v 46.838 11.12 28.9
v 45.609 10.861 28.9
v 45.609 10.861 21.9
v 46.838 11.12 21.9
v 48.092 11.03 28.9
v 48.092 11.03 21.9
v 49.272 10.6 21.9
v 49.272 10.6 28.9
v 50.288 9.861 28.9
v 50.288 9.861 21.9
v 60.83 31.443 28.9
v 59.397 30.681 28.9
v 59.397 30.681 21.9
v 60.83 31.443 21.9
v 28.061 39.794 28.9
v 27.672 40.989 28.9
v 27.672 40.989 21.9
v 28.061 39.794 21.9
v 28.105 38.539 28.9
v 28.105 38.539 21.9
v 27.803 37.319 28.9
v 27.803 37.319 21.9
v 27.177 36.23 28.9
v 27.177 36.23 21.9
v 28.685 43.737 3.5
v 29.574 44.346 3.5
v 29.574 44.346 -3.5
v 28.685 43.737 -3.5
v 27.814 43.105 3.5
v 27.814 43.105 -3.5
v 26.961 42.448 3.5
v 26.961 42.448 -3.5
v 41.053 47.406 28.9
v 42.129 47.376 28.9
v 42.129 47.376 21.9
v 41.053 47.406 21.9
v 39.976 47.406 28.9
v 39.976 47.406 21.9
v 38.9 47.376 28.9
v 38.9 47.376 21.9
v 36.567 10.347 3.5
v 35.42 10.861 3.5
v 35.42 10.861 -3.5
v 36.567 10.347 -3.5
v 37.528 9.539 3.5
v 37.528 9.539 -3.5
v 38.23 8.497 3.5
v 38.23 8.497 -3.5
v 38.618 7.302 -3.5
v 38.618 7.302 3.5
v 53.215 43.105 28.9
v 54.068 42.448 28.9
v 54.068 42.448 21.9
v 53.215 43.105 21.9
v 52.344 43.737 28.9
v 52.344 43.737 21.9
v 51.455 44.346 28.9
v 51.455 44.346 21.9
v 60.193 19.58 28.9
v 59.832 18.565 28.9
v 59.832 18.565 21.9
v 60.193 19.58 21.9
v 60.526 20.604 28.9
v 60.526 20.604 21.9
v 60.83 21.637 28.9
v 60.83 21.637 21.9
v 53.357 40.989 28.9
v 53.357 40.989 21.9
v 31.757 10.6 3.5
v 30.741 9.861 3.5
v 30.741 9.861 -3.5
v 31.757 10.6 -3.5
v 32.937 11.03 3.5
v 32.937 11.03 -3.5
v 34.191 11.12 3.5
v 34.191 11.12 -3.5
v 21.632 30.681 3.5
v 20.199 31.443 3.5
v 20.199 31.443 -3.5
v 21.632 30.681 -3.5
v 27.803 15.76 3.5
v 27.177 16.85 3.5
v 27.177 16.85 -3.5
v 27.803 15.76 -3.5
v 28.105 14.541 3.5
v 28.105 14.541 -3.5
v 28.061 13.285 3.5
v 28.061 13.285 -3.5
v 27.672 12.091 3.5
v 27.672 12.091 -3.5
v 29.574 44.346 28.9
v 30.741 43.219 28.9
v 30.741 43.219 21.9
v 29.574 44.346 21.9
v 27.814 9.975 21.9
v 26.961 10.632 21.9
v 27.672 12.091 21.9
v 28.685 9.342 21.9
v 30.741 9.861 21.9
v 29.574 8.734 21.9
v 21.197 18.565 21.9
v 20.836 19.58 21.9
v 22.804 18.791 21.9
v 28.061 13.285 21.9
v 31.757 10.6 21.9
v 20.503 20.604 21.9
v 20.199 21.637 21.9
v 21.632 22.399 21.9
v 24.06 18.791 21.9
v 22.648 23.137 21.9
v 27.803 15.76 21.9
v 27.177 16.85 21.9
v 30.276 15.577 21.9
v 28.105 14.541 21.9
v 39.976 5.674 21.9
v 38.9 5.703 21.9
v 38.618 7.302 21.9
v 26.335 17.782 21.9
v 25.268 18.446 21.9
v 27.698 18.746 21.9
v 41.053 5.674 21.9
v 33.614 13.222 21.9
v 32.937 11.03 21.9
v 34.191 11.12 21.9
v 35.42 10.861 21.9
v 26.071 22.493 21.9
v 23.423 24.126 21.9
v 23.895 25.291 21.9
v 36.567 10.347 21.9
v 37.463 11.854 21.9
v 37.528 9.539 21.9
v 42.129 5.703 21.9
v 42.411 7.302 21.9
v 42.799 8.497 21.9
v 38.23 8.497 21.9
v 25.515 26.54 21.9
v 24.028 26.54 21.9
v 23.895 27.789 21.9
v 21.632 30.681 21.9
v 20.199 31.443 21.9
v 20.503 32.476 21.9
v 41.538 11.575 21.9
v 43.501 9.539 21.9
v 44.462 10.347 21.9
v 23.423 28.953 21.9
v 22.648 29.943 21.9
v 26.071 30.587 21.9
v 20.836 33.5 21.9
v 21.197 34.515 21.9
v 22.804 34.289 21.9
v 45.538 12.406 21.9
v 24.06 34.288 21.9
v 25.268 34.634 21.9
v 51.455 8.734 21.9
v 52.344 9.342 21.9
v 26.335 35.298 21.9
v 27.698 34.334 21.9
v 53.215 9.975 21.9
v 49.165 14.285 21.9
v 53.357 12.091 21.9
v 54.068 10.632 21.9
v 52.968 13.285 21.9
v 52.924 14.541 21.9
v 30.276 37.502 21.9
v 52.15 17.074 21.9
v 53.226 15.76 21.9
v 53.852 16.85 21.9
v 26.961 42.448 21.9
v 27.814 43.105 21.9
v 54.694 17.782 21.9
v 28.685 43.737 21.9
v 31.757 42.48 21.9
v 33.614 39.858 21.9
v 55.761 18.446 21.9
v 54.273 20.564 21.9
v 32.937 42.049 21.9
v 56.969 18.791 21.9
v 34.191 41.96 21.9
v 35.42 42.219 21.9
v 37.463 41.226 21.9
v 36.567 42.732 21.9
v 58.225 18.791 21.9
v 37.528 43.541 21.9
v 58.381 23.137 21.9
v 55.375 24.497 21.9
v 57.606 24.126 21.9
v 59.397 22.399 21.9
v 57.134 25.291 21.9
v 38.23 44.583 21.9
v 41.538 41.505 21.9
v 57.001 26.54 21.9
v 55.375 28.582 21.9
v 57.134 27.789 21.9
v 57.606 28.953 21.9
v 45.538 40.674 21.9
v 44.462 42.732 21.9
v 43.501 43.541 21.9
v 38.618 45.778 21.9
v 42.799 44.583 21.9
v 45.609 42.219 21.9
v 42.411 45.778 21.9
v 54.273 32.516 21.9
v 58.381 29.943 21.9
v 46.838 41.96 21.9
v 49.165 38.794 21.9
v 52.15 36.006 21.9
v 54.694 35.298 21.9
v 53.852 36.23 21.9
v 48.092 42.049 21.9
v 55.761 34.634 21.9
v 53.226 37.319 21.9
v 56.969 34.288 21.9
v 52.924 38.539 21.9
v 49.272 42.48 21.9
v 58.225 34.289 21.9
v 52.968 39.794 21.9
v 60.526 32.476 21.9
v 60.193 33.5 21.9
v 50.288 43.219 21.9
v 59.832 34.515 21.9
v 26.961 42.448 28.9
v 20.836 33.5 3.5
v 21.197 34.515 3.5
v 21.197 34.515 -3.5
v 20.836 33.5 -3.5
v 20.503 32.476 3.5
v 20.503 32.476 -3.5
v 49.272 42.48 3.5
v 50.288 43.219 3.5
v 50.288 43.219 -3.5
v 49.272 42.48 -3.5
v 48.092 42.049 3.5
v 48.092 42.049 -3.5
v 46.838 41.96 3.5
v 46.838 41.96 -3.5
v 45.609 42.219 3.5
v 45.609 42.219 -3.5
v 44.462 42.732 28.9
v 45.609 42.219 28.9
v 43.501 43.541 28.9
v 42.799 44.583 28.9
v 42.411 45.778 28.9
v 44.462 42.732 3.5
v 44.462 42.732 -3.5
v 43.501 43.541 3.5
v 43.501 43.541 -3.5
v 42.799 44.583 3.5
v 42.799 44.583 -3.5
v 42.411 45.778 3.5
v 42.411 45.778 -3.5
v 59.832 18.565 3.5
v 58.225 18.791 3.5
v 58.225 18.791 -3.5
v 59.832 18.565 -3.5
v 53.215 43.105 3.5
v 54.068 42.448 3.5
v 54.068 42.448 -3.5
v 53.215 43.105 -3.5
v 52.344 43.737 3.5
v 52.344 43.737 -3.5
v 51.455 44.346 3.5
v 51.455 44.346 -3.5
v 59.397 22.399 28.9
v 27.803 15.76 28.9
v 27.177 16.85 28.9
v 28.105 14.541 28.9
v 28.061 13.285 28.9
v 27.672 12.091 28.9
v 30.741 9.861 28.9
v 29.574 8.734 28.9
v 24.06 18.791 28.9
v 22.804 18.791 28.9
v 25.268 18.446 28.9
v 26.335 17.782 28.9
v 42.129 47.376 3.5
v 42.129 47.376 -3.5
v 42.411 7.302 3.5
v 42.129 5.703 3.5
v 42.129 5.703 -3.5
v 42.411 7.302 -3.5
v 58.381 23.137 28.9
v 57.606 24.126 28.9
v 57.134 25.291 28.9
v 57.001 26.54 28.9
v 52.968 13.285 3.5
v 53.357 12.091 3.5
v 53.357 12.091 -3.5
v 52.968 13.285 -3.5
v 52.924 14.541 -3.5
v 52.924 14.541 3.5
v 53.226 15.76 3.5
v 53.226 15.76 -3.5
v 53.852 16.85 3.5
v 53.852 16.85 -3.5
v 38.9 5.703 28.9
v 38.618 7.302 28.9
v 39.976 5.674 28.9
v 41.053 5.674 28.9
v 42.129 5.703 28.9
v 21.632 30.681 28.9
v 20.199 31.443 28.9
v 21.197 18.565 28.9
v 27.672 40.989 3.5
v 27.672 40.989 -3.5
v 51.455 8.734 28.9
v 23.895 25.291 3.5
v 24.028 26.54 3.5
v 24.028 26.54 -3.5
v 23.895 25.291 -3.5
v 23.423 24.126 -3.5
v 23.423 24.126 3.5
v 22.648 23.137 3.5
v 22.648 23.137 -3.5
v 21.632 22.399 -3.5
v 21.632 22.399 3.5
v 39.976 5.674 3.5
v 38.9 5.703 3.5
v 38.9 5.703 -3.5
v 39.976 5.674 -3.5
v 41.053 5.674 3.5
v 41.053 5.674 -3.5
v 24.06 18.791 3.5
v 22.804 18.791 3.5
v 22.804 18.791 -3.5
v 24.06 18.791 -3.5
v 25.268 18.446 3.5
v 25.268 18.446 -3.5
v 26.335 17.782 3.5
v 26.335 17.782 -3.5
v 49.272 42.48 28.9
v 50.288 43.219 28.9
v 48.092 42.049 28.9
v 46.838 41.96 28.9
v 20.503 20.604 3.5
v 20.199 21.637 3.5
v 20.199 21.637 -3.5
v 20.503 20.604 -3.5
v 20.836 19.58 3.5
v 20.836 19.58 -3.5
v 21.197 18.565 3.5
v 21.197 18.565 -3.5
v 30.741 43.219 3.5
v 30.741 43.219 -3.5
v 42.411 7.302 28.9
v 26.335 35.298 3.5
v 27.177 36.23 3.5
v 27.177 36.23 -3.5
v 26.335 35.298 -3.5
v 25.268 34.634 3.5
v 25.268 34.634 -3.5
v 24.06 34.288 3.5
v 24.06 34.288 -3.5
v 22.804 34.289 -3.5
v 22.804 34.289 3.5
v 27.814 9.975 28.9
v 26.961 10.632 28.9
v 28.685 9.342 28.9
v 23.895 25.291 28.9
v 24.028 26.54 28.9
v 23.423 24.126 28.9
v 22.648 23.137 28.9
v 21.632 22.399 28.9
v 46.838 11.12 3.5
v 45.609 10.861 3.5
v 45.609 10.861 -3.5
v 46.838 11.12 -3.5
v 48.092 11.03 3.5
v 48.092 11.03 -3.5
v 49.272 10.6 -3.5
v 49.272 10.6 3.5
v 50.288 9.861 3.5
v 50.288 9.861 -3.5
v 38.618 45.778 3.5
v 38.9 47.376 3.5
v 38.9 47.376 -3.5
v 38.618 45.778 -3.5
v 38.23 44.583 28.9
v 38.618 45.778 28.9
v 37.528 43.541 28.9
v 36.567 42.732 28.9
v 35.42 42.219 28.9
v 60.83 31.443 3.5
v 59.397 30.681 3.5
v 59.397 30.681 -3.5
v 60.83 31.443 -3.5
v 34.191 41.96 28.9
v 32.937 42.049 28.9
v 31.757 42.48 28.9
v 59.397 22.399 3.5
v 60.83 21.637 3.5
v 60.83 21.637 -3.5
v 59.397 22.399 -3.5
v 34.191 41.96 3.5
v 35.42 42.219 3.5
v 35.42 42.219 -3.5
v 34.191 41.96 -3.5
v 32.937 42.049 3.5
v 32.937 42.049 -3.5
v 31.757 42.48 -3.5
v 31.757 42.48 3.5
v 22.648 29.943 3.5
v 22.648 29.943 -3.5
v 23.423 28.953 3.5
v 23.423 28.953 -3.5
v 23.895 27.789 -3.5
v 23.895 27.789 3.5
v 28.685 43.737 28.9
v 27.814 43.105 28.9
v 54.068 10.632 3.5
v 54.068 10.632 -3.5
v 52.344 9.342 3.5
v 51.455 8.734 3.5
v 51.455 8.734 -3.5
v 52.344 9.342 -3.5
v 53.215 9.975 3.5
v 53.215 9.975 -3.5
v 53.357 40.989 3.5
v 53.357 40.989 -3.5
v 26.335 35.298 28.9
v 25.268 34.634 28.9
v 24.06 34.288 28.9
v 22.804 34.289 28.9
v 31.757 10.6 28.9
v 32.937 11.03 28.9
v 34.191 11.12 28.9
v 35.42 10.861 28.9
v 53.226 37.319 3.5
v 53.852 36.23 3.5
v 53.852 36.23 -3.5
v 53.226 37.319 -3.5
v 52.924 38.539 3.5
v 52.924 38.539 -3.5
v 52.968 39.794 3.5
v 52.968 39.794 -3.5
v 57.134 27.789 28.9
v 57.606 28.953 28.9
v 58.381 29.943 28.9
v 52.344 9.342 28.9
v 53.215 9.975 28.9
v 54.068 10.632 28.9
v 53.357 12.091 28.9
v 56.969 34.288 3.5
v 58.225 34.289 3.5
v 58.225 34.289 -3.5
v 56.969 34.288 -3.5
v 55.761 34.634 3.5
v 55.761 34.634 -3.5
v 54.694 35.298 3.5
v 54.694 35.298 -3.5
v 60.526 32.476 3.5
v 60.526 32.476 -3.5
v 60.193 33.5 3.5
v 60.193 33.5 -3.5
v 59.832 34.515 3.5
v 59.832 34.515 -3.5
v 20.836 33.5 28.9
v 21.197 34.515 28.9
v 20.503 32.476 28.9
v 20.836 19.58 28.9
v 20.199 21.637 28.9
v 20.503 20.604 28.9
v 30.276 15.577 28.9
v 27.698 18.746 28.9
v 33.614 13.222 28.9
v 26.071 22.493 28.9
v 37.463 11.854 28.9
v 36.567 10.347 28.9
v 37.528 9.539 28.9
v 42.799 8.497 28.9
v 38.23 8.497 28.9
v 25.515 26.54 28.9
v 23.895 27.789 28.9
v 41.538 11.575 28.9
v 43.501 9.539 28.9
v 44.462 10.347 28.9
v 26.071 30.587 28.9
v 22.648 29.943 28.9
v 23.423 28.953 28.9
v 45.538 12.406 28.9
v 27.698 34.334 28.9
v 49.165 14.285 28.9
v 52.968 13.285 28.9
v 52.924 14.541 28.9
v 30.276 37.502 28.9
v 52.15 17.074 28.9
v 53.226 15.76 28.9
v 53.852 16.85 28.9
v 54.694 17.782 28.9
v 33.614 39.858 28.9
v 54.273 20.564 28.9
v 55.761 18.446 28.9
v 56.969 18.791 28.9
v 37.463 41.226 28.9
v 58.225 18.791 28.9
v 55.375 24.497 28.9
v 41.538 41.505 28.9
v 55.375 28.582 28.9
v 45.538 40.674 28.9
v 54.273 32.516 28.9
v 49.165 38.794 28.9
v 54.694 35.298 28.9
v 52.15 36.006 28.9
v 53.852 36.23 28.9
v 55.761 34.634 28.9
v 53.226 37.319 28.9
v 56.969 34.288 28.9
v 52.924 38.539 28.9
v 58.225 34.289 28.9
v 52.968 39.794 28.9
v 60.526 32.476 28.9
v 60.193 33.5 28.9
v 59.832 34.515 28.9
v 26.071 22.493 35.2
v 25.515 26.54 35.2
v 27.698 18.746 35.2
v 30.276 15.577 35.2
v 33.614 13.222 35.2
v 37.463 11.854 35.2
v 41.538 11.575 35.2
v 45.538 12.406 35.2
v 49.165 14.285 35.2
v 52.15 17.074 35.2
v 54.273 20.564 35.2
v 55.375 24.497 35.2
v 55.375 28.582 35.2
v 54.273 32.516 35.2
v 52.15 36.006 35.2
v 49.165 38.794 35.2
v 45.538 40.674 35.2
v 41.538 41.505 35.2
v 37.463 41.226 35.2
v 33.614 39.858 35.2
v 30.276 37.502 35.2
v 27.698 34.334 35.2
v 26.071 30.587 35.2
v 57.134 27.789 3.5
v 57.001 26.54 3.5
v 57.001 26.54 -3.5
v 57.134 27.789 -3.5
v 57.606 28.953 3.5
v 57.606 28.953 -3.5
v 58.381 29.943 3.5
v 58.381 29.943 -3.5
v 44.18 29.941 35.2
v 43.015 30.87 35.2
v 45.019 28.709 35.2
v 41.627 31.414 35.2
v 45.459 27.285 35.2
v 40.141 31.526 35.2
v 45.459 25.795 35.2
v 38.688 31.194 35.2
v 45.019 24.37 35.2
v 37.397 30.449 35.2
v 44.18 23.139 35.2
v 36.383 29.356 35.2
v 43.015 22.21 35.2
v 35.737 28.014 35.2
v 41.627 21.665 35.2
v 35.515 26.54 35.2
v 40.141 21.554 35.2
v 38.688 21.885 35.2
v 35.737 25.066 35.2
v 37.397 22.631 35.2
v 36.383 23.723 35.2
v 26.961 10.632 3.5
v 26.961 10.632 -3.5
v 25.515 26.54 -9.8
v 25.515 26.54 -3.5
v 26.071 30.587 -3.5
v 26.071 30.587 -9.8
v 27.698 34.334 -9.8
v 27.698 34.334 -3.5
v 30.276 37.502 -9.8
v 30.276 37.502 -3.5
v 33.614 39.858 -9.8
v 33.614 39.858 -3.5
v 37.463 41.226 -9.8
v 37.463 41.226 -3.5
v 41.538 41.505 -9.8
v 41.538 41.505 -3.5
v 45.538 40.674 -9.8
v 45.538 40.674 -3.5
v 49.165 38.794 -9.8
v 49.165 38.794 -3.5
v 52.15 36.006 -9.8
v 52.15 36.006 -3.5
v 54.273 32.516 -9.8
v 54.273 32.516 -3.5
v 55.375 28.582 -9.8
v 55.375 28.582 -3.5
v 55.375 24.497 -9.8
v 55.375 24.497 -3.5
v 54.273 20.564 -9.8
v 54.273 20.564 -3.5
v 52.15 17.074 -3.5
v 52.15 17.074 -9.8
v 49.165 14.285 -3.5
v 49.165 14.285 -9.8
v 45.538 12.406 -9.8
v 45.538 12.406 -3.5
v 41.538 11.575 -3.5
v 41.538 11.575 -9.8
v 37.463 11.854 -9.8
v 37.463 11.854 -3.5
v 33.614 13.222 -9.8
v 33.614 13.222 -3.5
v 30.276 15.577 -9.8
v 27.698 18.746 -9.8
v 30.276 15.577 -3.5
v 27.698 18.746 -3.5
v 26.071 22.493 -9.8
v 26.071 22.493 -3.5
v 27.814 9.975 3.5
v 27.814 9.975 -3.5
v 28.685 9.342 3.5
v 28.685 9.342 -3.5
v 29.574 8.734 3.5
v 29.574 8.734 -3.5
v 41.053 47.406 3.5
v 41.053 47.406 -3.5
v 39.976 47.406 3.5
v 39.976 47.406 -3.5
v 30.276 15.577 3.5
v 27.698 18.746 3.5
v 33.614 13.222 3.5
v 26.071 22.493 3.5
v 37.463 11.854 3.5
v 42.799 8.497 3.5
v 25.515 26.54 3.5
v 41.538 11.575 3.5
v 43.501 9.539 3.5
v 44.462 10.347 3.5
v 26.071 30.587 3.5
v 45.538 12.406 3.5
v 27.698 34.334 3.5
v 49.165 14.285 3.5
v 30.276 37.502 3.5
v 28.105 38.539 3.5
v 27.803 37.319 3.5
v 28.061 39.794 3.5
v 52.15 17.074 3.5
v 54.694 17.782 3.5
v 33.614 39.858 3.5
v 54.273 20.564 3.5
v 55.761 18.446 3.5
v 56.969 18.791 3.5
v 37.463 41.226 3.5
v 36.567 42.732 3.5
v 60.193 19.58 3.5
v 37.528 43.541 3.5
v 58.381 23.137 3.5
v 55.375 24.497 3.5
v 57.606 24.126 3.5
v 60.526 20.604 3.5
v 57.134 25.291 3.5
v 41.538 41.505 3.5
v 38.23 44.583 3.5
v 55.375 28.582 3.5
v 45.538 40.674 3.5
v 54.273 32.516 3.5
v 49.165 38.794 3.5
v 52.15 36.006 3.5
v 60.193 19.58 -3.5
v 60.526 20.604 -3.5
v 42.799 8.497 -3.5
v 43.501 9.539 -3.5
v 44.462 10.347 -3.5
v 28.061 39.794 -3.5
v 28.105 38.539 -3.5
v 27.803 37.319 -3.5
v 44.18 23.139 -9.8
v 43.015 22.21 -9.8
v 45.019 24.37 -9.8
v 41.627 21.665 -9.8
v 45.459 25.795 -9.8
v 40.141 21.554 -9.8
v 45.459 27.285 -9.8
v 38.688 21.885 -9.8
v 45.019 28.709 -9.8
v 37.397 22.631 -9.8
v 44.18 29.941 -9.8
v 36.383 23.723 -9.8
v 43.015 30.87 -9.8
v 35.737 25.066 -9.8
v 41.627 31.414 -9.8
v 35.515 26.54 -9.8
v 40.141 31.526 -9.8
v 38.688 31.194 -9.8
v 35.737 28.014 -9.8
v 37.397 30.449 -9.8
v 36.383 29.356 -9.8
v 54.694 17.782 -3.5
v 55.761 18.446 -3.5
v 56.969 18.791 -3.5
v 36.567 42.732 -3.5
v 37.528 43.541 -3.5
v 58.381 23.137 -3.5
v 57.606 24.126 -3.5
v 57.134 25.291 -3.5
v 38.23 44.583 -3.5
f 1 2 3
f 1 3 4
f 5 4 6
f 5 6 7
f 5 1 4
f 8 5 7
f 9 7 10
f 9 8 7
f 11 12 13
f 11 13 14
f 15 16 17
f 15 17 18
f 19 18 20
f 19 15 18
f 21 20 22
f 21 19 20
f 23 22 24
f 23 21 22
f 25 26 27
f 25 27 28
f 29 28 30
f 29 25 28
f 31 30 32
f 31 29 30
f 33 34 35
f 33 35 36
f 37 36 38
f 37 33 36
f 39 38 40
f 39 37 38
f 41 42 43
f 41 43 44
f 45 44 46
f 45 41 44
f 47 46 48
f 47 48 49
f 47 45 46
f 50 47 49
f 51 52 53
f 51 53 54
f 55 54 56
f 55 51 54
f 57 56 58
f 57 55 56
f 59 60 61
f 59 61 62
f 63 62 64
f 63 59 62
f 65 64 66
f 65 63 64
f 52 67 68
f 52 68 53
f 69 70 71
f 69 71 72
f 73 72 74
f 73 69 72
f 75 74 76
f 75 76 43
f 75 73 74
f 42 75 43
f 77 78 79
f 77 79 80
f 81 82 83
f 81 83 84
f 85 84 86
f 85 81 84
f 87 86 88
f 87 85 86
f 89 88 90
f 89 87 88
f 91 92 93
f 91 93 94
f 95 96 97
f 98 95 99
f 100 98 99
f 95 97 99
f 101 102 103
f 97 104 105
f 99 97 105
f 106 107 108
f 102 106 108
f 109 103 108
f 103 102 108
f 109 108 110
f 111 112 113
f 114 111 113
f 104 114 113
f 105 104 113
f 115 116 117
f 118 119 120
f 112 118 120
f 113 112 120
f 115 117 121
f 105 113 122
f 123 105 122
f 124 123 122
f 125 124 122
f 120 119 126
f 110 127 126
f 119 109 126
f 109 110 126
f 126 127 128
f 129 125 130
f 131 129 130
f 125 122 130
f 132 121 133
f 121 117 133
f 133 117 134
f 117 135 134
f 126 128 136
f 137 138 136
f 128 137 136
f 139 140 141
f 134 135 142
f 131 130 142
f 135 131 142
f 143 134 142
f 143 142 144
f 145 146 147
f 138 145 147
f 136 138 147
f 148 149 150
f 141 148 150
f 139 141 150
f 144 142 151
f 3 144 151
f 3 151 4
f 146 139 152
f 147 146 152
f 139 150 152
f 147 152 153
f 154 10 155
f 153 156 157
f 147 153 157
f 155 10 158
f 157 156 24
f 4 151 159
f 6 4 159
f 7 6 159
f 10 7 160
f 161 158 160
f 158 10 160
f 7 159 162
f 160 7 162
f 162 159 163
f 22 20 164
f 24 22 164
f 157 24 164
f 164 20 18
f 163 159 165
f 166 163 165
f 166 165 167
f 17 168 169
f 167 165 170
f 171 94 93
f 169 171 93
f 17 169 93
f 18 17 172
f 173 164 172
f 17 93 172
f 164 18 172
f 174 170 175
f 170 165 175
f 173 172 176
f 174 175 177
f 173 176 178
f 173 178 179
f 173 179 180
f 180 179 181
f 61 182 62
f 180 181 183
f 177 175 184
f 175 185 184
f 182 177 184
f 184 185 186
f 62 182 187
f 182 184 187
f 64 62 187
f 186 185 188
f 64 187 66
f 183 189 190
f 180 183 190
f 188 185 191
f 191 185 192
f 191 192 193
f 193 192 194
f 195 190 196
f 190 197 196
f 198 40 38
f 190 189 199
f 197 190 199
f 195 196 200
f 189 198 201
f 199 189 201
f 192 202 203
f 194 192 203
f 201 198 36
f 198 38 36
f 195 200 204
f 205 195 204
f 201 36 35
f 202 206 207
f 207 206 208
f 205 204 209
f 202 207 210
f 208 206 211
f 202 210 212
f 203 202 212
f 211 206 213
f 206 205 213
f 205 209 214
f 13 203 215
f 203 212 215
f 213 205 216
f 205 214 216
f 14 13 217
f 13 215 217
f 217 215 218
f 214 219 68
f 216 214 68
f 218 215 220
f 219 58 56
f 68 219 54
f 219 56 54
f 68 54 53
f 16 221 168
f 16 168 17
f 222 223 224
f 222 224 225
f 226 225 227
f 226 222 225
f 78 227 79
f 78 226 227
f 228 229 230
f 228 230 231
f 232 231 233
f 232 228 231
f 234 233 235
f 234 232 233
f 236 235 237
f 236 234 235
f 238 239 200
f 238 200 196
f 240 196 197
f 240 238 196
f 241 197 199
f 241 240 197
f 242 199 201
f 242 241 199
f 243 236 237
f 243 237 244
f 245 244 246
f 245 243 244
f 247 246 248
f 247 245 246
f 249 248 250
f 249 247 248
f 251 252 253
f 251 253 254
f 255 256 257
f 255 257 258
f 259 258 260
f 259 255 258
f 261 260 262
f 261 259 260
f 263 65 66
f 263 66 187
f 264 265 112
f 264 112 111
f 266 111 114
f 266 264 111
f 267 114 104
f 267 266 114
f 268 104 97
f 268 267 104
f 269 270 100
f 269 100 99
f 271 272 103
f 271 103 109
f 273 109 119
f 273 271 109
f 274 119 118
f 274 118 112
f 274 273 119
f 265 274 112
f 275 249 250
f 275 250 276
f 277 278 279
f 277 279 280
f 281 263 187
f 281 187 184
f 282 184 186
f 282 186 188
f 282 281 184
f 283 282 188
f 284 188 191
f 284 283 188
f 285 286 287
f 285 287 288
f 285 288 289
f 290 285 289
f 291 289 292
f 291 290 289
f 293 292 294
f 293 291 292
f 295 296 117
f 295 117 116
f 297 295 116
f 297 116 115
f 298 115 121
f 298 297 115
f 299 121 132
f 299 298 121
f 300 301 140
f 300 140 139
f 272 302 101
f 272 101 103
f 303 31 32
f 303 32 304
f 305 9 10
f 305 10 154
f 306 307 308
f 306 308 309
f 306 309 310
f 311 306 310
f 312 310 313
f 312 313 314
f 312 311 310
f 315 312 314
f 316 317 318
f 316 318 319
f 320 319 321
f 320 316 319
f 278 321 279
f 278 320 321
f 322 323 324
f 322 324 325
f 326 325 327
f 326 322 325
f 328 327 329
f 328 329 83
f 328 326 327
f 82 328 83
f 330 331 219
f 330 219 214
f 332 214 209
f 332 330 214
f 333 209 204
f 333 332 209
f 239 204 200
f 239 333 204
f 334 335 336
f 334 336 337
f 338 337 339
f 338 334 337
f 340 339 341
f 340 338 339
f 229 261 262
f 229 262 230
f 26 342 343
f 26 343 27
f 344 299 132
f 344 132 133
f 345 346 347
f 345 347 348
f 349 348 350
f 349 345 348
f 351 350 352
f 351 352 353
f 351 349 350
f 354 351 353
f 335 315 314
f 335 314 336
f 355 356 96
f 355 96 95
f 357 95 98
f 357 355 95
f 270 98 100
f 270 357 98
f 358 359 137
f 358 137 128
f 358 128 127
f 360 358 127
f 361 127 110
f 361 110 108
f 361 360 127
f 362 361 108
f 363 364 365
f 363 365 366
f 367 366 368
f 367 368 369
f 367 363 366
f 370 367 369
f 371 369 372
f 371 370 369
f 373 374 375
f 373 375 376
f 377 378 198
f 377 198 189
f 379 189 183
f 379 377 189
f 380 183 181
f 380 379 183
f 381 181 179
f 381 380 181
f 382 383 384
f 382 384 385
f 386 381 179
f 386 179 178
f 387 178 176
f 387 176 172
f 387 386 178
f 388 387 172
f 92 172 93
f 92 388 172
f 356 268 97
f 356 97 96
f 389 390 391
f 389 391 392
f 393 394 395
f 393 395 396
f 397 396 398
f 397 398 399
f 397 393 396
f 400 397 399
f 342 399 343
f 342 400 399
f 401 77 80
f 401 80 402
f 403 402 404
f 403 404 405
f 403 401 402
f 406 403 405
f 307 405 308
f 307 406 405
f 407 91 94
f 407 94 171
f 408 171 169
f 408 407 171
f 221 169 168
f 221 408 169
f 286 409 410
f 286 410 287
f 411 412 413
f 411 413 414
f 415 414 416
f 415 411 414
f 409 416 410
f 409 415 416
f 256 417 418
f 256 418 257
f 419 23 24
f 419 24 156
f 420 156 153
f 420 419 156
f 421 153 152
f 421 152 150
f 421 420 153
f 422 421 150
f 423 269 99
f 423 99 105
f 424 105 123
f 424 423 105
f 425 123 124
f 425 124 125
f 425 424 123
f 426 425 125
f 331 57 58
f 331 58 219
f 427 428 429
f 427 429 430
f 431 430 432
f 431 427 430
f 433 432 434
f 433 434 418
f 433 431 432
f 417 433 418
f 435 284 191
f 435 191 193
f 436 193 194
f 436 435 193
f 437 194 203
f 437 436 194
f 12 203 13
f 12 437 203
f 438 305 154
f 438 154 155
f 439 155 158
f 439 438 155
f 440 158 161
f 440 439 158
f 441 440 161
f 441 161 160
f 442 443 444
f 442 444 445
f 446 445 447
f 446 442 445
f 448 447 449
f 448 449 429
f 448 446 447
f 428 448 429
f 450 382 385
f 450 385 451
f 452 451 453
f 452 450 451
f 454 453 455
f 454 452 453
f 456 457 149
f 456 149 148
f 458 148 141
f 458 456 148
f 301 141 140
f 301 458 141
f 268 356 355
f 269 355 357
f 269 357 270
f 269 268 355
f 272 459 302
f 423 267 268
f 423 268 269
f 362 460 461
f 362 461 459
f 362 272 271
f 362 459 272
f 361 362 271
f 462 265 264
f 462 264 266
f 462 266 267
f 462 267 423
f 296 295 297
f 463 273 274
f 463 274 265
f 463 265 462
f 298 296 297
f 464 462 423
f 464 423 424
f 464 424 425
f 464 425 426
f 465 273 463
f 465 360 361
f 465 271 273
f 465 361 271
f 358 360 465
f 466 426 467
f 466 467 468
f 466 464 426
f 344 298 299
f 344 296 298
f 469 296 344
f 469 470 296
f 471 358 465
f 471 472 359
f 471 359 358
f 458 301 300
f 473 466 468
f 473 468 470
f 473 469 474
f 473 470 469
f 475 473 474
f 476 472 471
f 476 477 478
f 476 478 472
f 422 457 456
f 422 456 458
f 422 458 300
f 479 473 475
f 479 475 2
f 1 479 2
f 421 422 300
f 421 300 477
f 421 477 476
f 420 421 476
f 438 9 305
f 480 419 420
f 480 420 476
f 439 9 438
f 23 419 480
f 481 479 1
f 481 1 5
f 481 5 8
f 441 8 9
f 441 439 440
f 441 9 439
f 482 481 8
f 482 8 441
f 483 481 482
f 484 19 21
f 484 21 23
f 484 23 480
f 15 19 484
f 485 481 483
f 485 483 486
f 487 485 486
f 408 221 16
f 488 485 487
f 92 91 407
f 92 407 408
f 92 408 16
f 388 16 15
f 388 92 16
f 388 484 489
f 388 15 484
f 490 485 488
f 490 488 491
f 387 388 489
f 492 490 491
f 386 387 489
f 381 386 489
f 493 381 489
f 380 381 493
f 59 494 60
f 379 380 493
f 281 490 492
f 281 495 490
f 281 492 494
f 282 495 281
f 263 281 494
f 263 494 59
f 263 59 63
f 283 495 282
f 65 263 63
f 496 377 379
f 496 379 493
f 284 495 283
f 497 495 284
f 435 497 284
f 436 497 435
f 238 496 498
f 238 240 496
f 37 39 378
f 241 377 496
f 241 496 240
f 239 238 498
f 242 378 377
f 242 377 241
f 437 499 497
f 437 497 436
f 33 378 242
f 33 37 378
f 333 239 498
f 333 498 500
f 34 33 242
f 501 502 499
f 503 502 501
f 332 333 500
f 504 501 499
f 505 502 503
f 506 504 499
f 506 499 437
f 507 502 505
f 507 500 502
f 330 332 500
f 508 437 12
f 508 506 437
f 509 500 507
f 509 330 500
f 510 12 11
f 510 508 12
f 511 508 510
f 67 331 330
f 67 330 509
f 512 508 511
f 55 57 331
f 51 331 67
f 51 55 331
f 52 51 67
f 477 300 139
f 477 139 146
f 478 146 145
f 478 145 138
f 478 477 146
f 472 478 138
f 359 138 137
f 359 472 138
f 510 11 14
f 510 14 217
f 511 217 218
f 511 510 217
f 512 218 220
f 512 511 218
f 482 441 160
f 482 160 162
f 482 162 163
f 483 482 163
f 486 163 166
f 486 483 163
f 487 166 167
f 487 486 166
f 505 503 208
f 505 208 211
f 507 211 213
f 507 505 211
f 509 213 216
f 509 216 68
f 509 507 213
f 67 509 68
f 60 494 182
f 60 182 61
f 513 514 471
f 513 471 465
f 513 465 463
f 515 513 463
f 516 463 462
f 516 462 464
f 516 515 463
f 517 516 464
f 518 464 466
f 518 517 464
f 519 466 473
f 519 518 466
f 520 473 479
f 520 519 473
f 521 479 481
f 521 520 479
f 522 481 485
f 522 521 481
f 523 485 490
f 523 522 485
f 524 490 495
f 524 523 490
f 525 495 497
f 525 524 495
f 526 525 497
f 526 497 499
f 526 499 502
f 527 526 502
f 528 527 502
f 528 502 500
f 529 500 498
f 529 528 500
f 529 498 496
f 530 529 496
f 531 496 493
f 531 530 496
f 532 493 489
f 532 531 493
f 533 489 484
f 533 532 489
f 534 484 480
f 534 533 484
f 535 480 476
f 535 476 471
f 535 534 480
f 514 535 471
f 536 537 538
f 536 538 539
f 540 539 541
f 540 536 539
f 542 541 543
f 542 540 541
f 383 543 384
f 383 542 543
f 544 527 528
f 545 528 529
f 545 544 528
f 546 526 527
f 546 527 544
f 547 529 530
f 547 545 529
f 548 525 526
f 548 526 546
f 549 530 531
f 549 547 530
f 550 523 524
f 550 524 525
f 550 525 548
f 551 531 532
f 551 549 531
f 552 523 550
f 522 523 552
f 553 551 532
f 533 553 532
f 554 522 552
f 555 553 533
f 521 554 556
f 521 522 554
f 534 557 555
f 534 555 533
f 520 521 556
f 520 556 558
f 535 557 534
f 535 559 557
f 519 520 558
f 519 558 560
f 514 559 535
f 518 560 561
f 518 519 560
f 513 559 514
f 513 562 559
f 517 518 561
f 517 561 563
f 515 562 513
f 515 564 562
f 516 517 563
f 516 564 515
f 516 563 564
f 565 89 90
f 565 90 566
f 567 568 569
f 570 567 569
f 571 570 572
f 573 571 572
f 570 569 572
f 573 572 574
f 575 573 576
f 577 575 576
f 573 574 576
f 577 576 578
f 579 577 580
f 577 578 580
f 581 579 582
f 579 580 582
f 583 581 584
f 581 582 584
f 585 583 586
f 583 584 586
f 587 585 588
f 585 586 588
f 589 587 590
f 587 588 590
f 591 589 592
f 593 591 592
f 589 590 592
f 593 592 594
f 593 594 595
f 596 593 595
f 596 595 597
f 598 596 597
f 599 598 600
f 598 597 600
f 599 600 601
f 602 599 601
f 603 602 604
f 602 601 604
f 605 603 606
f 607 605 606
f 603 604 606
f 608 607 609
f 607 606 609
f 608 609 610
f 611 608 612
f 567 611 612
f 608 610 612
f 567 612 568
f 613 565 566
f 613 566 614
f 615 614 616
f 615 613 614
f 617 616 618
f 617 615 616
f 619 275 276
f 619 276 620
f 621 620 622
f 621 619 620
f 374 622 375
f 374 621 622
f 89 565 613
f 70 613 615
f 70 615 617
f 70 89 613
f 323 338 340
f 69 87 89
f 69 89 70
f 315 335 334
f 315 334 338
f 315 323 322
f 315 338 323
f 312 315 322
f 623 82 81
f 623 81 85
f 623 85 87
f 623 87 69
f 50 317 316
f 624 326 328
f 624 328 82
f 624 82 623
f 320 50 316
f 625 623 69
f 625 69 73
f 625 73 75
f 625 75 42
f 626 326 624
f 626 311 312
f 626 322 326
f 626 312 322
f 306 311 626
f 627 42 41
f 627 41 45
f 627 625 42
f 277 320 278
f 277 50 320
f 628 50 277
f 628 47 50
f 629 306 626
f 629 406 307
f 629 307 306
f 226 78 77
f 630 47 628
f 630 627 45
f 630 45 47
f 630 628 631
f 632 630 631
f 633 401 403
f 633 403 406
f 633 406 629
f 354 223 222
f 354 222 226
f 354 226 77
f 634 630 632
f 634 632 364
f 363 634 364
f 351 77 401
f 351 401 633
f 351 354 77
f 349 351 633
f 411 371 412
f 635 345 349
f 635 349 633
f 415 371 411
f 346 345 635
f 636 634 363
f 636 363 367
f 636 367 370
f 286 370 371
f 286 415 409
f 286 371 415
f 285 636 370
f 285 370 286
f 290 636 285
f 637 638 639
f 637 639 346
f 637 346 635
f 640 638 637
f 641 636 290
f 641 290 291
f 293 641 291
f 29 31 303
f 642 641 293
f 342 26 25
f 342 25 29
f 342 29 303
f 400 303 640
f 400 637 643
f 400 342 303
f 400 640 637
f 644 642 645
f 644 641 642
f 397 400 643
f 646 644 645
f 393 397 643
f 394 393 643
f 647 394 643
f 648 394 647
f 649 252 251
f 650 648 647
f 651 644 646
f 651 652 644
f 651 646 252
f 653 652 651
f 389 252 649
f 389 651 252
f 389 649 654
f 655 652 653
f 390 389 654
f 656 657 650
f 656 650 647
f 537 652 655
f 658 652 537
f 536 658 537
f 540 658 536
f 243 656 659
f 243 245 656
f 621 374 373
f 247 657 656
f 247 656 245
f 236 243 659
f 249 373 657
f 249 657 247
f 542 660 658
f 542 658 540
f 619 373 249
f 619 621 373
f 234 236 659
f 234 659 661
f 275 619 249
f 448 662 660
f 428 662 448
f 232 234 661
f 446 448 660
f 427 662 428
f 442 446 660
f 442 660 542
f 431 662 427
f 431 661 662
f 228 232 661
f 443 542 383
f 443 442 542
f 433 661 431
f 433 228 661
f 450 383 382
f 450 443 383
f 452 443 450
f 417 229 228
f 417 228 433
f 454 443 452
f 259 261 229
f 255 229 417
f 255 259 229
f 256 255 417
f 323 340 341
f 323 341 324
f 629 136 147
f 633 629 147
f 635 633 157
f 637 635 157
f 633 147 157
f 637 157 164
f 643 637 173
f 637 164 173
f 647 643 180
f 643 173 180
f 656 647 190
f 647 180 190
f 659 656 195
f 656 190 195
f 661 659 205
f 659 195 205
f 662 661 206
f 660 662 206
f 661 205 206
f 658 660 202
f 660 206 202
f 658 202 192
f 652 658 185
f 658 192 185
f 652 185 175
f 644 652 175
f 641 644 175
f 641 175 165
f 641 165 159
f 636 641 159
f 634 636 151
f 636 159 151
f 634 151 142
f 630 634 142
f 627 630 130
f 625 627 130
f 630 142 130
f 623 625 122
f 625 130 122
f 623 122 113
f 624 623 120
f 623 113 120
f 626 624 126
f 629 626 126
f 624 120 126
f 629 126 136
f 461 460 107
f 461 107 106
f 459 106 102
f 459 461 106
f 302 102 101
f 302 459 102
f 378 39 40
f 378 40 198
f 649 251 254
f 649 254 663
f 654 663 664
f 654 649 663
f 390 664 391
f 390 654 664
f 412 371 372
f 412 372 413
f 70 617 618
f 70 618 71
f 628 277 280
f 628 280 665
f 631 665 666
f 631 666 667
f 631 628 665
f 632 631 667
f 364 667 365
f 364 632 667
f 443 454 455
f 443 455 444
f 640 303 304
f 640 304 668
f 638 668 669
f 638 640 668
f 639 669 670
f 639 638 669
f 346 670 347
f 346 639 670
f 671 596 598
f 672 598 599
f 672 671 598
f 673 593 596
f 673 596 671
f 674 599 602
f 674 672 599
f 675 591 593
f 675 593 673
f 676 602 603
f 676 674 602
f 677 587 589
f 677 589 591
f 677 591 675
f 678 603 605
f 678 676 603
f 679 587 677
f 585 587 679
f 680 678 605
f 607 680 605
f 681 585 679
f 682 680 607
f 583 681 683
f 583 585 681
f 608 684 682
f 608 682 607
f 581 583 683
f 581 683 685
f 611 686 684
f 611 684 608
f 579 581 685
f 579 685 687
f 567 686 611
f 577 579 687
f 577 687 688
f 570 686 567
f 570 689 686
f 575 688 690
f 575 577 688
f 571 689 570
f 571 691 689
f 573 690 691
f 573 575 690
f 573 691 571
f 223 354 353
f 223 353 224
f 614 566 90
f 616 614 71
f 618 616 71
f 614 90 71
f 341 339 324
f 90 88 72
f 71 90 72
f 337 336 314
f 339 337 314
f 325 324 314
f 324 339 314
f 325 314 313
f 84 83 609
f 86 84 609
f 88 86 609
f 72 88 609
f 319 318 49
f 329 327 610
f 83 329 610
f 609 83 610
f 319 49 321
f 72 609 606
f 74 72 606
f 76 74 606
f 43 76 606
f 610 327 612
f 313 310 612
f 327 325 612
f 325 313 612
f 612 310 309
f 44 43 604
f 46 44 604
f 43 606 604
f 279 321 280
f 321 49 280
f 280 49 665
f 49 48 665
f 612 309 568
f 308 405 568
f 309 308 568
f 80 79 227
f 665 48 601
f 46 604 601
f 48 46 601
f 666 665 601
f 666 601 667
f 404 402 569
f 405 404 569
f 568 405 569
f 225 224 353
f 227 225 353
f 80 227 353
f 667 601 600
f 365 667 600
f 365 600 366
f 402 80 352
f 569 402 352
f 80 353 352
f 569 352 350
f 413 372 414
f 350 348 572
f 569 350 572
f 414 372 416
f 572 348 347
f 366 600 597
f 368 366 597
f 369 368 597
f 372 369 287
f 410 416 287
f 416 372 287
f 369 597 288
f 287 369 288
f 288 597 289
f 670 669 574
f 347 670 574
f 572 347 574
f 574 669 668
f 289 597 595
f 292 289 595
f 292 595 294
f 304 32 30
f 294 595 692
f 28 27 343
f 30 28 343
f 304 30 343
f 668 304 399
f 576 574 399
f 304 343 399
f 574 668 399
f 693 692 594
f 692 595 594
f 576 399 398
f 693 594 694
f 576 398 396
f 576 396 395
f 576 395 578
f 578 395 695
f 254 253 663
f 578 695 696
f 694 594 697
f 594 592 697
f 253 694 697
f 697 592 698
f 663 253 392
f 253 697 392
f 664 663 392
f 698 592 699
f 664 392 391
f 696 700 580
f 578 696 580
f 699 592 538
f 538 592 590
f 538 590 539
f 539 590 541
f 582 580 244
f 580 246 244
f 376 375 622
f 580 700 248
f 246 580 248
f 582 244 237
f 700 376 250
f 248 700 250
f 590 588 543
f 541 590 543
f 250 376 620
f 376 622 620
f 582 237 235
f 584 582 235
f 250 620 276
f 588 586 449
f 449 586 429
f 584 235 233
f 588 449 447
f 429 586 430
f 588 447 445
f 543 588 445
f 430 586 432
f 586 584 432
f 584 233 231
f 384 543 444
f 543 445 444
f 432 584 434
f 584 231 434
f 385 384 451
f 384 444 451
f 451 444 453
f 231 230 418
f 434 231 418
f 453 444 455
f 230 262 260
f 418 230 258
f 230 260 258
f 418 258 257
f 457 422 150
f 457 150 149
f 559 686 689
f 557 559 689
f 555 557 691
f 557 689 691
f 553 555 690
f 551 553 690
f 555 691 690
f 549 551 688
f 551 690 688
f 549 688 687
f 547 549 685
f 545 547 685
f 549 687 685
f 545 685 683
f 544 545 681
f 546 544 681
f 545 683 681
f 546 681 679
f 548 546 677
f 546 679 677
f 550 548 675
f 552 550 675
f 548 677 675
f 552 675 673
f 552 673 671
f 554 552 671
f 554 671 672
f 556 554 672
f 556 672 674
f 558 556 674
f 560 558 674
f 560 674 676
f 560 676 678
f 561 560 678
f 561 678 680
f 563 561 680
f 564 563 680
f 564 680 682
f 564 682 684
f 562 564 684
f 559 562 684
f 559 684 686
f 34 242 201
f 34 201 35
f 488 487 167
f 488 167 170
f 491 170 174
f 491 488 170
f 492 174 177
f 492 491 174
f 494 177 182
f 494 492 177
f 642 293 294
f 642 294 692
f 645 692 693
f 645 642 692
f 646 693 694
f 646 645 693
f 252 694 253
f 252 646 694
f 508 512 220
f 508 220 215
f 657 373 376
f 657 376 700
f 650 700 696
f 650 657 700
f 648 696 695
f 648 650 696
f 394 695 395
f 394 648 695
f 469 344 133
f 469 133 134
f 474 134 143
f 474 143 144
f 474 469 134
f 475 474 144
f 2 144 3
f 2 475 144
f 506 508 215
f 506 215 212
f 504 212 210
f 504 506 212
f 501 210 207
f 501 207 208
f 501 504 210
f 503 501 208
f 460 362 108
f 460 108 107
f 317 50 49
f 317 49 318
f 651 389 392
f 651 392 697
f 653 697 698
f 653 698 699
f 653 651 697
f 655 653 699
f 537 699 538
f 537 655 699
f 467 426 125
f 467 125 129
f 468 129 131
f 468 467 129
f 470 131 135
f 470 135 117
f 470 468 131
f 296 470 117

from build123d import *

# Parameters (mm, degrees)
EXTRUDE_1_DEPTH     = 7
SKETCH_2_R          = 15
EXTRUDE_2_DEPTH     = 18.4
EXTRUDE_3_DEPTH     = 7
EXTRUDE_START       = 6.3
SKETCH_4_R          = 15
EXTRUDE_4_DEPTH     = 6.3
SKETCH_5_R          = 15
EXTRUDE_5_DEPTH     = 6.3
SKETCH_6_R          = 5
CUT_EXTRUDE_1_DEPTH = 90.291681756


with BuildPart() as part:
    # 草图1 → 凸台-拉伸1 (new body)
    with BuildSketch(Plane.XY.offset(28.9)):
        with BuildLine():
            Line((42.411201909, 45.77806603), (42.129389286, 47.376304833))
            ThreePointArc((42.129389286, 47.376304833), (40.514502568, 47.409839327), (38.89961585, 47.376304833))
            Line((38.89961585, 47.376304833), (38.617803227, 45.77806603))
            ThreePointArc((38.617803227, 45.77806603), (37.528159676, 43.541003491), (35.420005537, 42.219088972))
            ThreePointArc((35.420005537, 42.219088972), (32.937471152, 42.04939837), (30.741018632, 43.218743572))
            Line((30.741018632, 43.218743572), (29.573606233, 44.346100621))
            ThreePointArc((29.573606233, 44.346100621), (28.247424353, 43.424024), (26.960664635, 42.447687427))
            Line((26.960664635, 42.447687427), (27.672094632, 40.98903977))
            ThreePointArc((27.672094632, 40.98903977), (28.10546685, 38.538741749), (27.176936184, 36.230148526))
            ThreePointArc((27.176936184, 36.230148526), (25.268265311, 34.633668845), (22.80397403, 34.288646587))
            Line((22.80397403, 34.288646587), (21.196873713, 34.514509808))
            ThreePointArc((21.196873713, 34.514509808), (20.665953073, 32.989024), (20.198818833, 31.442812735))
            Line((20.198818833, 31.442812735), (21.631749371, 30.680910052))
            ThreePointArc((21.631749371, 30.680910052), (23.422603901, 28.95330711), (24.028363863, 26.539839327))
            ThreePointArc((24.028363863, 26.539839327), (23.422603901, 24.126371544), (21.631749371, 22.398768602))
            Line((21.631749371, 22.398768602), (20.198818833, 21.63686592))
            ThreePointArc((20.198818833, 21.63686592), (20.665953073, 20.090654655), (21.196873713, 18.565168847))
            Line((21.196873713, 18.565168847), (22.80397403, 18.791032067))
            ThreePointArc((22.80397403, 18.791032067), (25.268265311, 18.446009809), (27.176936184, 16.849530129))
            ThreePointArc((27.176936184, 16.849530129), (28.10546685, 14.540936905), (27.672094632, 12.090638884))
            Line((27.672094632, 12.090638884), (26.960664635, 10.631991228))
            ThreePointArc((26.960664635, 10.631991228), (28.247424353, 9.655654655), (29.573606233, 8.733578033))
            Line((29.573606233, 8.733578033), (30.741018632, 9.860935083))
            ThreePointArc((30.741018632, 9.860935083), (32.937471152, 11.030280285), (35.420005536, 10.860589683))
            ThreePointArc((35.420005536, 10.860589683), (37.528159676, 9.538675164), (38.617803227, 7.301612625))
            Line((38.617803227, 7.301612625), (38.89961585, 5.703373822))
            ThreePointArc((38.89961585, 5.703373822), (40.514502568, 5.669839327), (42.129389286, 5.703373822))
            Line((42.129389286, 5.703373822), (42.411201909, 7.301612625))
            ThreePointArc((42.411201909, 7.301612625), (43.50084546, 9.538675164), (45.6089996, 10.860589683))
            ThreePointArc((45.6089996, 10.860589683), (48.091533984, 11.030280285), (50.287986504, 9.860935083))
            Line((50.287986504, 9.860935083), (51.455398903, 8.733578033))
            ThreePointArc((51.455398903, 8.733578033), (52.781580783, 9.655654655), (54.068340501, 10.631991228))
            Line((54.068340501, 10.631991228), (53.356910504, 12.090638884))
            ThreePointArc((53.356910504, 12.090638884), (52.923538286, 14.540936905), (53.852068952, 16.849530129))
            ThreePointArc((53.852068952, 16.849530129), (55.760739826, 18.446009809), (58.225031106, 18.791032067))
            Line((58.225031106, 18.791032067), (59.832131424, 18.565168847))
            ThreePointArc((59.832131424, 18.565168847), (60.363052063, 20.090654655), (60.830186304, 21.63686592))
            Line((60.830186304, 21.63686592), (59.397255765, 22.398768602))
            ThreePointArc((59.397255765, 22.398768602), (57.606401235, 24.126371544), (57.000641274, 26.539839327))
            ThreePointArc((57.000641274, 26.539839327), (57.606401235, 28.95330711), (59.397255765, 30.680910052))
            Line((59.397255765, 30.680910052), (60.830186304, 31.442812735))
            ThreePointArc((60.830186304, 31.442812735), (60.363052063, 32.989024), (59.832131424, 34.514509808))
            Line((59.832131424, 34.514509808), (58.225031106, 34.288646587))
            ThreePointArc((58.225031106, 34.288646587), (55.760739826, 34.633668845), (53.852068952, 36.230148526))
            ThreePointArc((53.852068952, 36.230148526), (52.923538286, 38.538741749), (53.356910504, 40.98903977))
            Line((53.356910504, 40.98903977), (54.068340501, 42.447687427))
            ThreePointArc((54.068340501, 42.447687427), (52.781580783, 43.424024), (51.455398903, 44.346100621))
            Line((51.455398903, 44.346100621), (50.287986504, 43.218743572))
            ThreePointArc((50.287986504, 43.218743572), (48.091533984, 42.04939837), (45.6089996, 42.219088972))
            ThreePointArc((45.6089996, 42.219088972), (43.50084546, 43.541003491), (42.411201909, 45.77806603))
        make_face()
    extrude(amount=-EXTRUDE_1_DEPTH)

    # 草图2 → 凸台-拉伸2 (add)
    with BuildSketch(Plane(origin=(0, 0, 21.9), x_dir=(-1, 0, 0), z_dir=(0, 0, -1))):
        with Locations((-40.514502568, 26.539839327)):
            Circle(SKETCH_2_R)
    extrude(amount=EXTRUDE_2_DEPTH)

    # 草图3 → 凸台-拉伸3 (add)
    with BuildSketch(Plane.XY.offset(3.5)):
        with BuildLine():
            Line((42.411201909, 45.77806603), (42.129389286, 47.376304833))
            ThreePointArc((42.129389286, 47.376304833), (40.514502568, 47.409839327), (38.89961585, 47.376304833))
            Line((38.89961585, 47.376304833), (38.617803227, 45.77806603))
            ThreePointArc((38.617803227, 45.77806603), (37.528159676, 43.541003491), (35.420005537, 42.219088972))
            ThreePointArc((35.420005537, 42.219088972), (32.937471152, 42.04939837), (30.741018632, 43.218743572))
            Line((30.741018632, 43.218743572), (29.573606233, 44.346100621))
            ThreePointArc((29.573606233, 44.346100621), (28.247424353, 43.424024), (26.960664635, 42.447687427))
            Line((26.960664635, 42.447687427), (27.672094632, 40.98903977))
            ThreePointArc((27.672094632, 40.98903977), (28.10546685, 38.538741749), (27.176936184, 36.230148526))
            ThreePointArc((27.176936184, 36.230148526), (25.268265311, 34.633668845), (22.80397403, 34.288646587))
            Line((22.80397403, 34.288646587), (21.196873713, 34.514509808))
            ThreePointArc((21.196873713, 34.514509808), (20.665953073, 32.989024), (20.198818833, 31.442812735))
            Line((20.198818833, 31.442812735), (21.631749371, 30.680910052))
            ThreePointArc((21.631749371, 30.680910052), (23.422603901, 28.95330711), (24.028363863, 26.539839327))
            ThreePointArc((24.028363863, 26.539839327), (23.422603901, 24.126371544), (21.631749371, 22.398768602))
            Line((21.631749371, 22.398768602), (20.198818833, 21.63686592))
            ThreePointArc((20.198818833, 21.63686592), (20.665953073, 20.090654655), (21.196873713, 18.565168847))
            Line((21.196873713, 18.565168847), (22.80397403, 18.791032067))
            ThreePointArc((22.80397403, 18.791032067), (25.268265311, 18.446009809), (27.176936184, 16.849530129))
            ThreePointArc((27.176936184, 16.849530129), (28.10546685, 14.540936905), (27.672094632, 12.090638884))
            Line((27.672094632, 12.090638884), (26.960664635, 10.631991228))
            ThreePointArc((26.960664635, 10.631991228), (28.247424353, 9.655654655), (29.573606233, 8.733578033))
            Line((29.573606233, 8.733578033), (30.741018632, 9.860935083))
            ThreePointArc((30.741018632, 9.860935083), (32.937471152, 11.030280285), (35.420005536, 10.860589683))
            ThreePointArc((35.420005536, 10.860589683), (37.528159676, 9.538675164), (38.617803227, 7.301612625))
            Line((38.617803227, 7.301612625), (38.89961585, 5.703373822))
            ThreePointArc((38.89961585, 5.703373822), (40.514502568, 5.669839327), (42.129389286, 5.703373822))
            Line((42.129389286, 5.703373822), (42.411201909, 7.301612625))
            ThreePointArc((42.411201909, 7.301612625), (43.50084546, 9.538675164), (45.6089996, 10.860589683))
            ThreePointArc((45.6089996, 10.860589683), (48.091533984, 11.030280285), (50.287986504, 9.860935083))
            Line((50.287986504, 9.860935083), (51.455398903, 8.733578033))
            ThreePointArc((51.455398903, 8.733578033), (52.781580783, 9.655654655), (54.068340501, 10.631991228))
            Line((54.068340501, 10.631991228), (53.356910504, 12.090638884))
            ThreePointArc((53.356910504, 12.090638884), (52.923538286, 14.540936905), (53.852068952, 16.849530129))
            ThreePointArc((53.852068952, 16.849530129), (55.760739826, 18.446009809), (58.225031106, 18.791032067))
            Line((58.225031106, 18.791032067), (59.832131424, 18.565168847))
            ThreePointArc((59.832131424, 18.565168847), (60.363052063, 20.090654655), (60.830186304, 21.63686592))
            Line((60.830186304, 21.63686592), (59.397255765, 22.398768602))
            ThreePointArc((59.397255765, 22.398768602), (57.606401235, 24.126371544), (57.000641274, 26.539839327))
            ThreePointArc((57.000641274, 26.539839327), (57.606401235, 28.95330711), (59.397255765, 30.680910052))
            Line((59.397255765, 30.680910052), (60.830186304, 31.442812735))
            ThreePointArc((60.830186304, 31.442812735), (60.363052063, 32.989024), (59.832131424, 34.514509808))
            Line((59.832131424, 34.514509808), (58.225031106, 34.288646587))
            ThreePointArc((58.225031106, 34.288646587), (55.760739826, 34.633668845), (53.852068952, 36.230148526))
            ThreePointArc((53.852068952, 36.230148526), (52.923538286, 38.538741749), (53.356910504, 40.98903977))
            Line((53.356910504, 40.98903977), (54.068340501, 42.447687427))
            ThreePointArc((54.068340501, 42.447687427), (52.781580783, 43.424024), (51.455398903, 44.346100621))
            Line((51.455398903, 44.346100621), (50.287986504, 43.218743572))
            ThreePointArc((50.287986504, 43.218743572), (48.091533984, 42.04939837), (45.6089996, 42.219088972))
            ThreePointArc((45.6089996, 42.219088972), (43.50084546, 43.541003491), (42.411201909, 45.77806603))
        make_face()
    extrude(amount=-EXTRUDE_3_DEPTH)

    # 草图4 → 凸台-拉伸4 (add)
    with BuildSketch(Plane.XY.offset(28.9).offset(EXTRUDE_START)):
        with Locations(Location((40.514502568, 26.539839327, 0), (0, 0, 180))):
            Circle(SKETCH_4_R)
    extrude(amount=-EXTRUDE_4_DEPTH)

    # 草图5 → 凸台-拉伸5 (add)
    with BuildSketch(Plane(origin=(0, 0, -3.5), x_dir=(-1, 0, 0), z_dir=(0, 0, -1))):
        with Locations((-40.514502568, 26.539839327)):
            Circle(SKETCH_5_R)
    extrude(amount=EXTRUDE_5_DEPTH)

    # 草图6 → 切除-拉伸1 (cut, through all)
    with BuildSketch(Plane(origin=(0, 0, -9.8), x_dir=(-1, 0, 0), z_dir=(0, 0, -1))):
        with Locations((-40.514502568, 26.539839327)):
            Circle(SKETCH_6_R)
    extrude(amount=-CUT_EXTRUDE_1_DEPTH, mode=Mode.SUBTRACT)


solid = part.part
